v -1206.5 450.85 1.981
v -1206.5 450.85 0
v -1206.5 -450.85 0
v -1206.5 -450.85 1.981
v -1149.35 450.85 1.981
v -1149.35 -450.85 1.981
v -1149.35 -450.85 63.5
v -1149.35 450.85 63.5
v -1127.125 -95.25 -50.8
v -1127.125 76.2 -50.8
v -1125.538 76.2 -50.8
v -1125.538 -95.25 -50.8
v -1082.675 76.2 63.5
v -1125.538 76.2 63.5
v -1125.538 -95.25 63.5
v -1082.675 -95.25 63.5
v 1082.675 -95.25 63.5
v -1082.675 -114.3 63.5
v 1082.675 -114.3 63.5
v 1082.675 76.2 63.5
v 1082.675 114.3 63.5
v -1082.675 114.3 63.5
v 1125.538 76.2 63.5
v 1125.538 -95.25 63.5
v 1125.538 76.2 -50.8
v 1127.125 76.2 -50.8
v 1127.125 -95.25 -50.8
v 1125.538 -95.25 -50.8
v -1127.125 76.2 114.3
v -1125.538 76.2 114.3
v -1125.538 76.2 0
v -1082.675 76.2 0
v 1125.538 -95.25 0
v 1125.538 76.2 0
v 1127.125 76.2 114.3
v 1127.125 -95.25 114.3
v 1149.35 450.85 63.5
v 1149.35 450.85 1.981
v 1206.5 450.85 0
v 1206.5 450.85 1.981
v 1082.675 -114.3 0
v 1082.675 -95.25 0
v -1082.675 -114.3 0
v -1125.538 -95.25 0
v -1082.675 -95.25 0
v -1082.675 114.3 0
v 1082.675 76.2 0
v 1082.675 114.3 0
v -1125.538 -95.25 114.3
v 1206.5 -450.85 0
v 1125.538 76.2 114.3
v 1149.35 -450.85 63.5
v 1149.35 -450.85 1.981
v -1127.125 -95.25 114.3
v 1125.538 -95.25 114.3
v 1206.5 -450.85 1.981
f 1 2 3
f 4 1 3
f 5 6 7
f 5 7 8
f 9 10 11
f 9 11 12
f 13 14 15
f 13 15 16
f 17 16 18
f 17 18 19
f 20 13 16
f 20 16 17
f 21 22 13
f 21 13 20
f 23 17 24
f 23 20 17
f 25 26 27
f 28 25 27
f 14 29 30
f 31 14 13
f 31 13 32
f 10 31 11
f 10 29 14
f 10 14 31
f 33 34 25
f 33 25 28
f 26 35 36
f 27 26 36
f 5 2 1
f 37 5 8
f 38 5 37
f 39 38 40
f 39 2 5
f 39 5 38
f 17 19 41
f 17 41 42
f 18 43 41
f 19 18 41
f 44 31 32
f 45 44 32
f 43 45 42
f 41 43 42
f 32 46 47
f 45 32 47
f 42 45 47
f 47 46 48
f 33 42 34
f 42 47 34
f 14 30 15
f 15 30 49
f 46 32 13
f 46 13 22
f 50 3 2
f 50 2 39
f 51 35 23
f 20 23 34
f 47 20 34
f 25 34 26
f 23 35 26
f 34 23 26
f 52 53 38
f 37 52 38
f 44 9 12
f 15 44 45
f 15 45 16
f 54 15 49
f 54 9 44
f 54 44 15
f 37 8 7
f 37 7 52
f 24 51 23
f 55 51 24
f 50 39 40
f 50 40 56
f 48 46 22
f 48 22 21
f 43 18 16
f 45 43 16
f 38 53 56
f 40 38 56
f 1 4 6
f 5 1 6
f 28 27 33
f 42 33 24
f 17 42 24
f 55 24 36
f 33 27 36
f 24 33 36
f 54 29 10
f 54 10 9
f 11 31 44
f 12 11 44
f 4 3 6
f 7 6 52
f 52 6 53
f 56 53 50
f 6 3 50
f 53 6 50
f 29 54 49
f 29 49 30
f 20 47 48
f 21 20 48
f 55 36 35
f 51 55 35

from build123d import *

# Parameters (mm, degrees)
F0_W     = 2298.7
F0_H     = 901.7
F1_DEPTH = 63.5
F2_W     = 57.15
F2_H     = 901.7
F3_DEPTH = 1.9812
F4_W     = 2254.25
F4_H     = 228.6
F5_DEPTH = 63.5
F6_W     = 44.45
F6_H     = 38.1
F6_H_2   = 19.05
F7_DEPTH = 63.501
F9_DEPTH = 1.5875


# Not quite as in the source:
# - a pattern or mirror of a feature is missing from the dataset's text; its kind, count and spacing are read off the source's solid


with BuildPart() as f1:
    # F0 (on Top) → F1 (new body)
    with BuildSketch(Plane.XY):
        Rectangle(F0_W, F0_H)
    extrude(amount=F1_DEPTH)

    # F2 (on face) → F3 (join)
    with BuildSketch(Plane(origin=(0, 0, 0), x_dir=(1, 0, 0), z_dir=(0, 0, -1))):
        with Locations((-1177.925, 0)):
            Rectangle(F2_W, F2_H)
        with Locations((1177.925, 0)):
            Rectangle(F2_W, F2_H)
    extrude(amount=-F3_DEPTH)


with BuildPart() as f5:
    # F4 (on Top) → F5 (new body)
    with BuildSketch(Plane.XY):
        Rectangle(F4_W, F4_H)
    extrude(amount=F5_DEPTH)

    # F6 (on face) → F7 (cut, through all)
    with BuildSketch(Plane.XY.offset(63.5)):
        with Locations((-1104.9, 95.25)):
            Rectangle(F6_W, F6_H)
        with Locations((-1104.9, -104.775)):
            Rectangle(F6_W, F6_H_2)
        with Locations((1104.9, -104.775)):
            Rectangle(F6_W, F6_H_2)
        with Locations((1104.9, 95.25)):
            Rectangle(F6_W, F6_H)
    extrude(amount=-F7_DEPTH, mode=Mode.SUBTRACT)

    # F8 (on face) → F9 (join)
    with BuildSketch(Plane(origin=(-1127.125, 0, 0), x_dir=(0, -1, 0), z_dir=(-1, 0, 0))):
        Polygon((-76.2, 114.3), (-76.2, 31.75), (-76.2, -50.8), (95.25, -50.8), (95.25, 31.75), (95.25, 114.3), align=None)
    f9 = extrude(amount=-F9_DEPTH)

    # F9_copies: F9 across plane
    add(f9.mirror(Plane(origin=(0, 0, 0), x_dir=(0, 0, 1), z_dir=(1, 0, 0))))


solid = Compound([f1.part, f5.part])
